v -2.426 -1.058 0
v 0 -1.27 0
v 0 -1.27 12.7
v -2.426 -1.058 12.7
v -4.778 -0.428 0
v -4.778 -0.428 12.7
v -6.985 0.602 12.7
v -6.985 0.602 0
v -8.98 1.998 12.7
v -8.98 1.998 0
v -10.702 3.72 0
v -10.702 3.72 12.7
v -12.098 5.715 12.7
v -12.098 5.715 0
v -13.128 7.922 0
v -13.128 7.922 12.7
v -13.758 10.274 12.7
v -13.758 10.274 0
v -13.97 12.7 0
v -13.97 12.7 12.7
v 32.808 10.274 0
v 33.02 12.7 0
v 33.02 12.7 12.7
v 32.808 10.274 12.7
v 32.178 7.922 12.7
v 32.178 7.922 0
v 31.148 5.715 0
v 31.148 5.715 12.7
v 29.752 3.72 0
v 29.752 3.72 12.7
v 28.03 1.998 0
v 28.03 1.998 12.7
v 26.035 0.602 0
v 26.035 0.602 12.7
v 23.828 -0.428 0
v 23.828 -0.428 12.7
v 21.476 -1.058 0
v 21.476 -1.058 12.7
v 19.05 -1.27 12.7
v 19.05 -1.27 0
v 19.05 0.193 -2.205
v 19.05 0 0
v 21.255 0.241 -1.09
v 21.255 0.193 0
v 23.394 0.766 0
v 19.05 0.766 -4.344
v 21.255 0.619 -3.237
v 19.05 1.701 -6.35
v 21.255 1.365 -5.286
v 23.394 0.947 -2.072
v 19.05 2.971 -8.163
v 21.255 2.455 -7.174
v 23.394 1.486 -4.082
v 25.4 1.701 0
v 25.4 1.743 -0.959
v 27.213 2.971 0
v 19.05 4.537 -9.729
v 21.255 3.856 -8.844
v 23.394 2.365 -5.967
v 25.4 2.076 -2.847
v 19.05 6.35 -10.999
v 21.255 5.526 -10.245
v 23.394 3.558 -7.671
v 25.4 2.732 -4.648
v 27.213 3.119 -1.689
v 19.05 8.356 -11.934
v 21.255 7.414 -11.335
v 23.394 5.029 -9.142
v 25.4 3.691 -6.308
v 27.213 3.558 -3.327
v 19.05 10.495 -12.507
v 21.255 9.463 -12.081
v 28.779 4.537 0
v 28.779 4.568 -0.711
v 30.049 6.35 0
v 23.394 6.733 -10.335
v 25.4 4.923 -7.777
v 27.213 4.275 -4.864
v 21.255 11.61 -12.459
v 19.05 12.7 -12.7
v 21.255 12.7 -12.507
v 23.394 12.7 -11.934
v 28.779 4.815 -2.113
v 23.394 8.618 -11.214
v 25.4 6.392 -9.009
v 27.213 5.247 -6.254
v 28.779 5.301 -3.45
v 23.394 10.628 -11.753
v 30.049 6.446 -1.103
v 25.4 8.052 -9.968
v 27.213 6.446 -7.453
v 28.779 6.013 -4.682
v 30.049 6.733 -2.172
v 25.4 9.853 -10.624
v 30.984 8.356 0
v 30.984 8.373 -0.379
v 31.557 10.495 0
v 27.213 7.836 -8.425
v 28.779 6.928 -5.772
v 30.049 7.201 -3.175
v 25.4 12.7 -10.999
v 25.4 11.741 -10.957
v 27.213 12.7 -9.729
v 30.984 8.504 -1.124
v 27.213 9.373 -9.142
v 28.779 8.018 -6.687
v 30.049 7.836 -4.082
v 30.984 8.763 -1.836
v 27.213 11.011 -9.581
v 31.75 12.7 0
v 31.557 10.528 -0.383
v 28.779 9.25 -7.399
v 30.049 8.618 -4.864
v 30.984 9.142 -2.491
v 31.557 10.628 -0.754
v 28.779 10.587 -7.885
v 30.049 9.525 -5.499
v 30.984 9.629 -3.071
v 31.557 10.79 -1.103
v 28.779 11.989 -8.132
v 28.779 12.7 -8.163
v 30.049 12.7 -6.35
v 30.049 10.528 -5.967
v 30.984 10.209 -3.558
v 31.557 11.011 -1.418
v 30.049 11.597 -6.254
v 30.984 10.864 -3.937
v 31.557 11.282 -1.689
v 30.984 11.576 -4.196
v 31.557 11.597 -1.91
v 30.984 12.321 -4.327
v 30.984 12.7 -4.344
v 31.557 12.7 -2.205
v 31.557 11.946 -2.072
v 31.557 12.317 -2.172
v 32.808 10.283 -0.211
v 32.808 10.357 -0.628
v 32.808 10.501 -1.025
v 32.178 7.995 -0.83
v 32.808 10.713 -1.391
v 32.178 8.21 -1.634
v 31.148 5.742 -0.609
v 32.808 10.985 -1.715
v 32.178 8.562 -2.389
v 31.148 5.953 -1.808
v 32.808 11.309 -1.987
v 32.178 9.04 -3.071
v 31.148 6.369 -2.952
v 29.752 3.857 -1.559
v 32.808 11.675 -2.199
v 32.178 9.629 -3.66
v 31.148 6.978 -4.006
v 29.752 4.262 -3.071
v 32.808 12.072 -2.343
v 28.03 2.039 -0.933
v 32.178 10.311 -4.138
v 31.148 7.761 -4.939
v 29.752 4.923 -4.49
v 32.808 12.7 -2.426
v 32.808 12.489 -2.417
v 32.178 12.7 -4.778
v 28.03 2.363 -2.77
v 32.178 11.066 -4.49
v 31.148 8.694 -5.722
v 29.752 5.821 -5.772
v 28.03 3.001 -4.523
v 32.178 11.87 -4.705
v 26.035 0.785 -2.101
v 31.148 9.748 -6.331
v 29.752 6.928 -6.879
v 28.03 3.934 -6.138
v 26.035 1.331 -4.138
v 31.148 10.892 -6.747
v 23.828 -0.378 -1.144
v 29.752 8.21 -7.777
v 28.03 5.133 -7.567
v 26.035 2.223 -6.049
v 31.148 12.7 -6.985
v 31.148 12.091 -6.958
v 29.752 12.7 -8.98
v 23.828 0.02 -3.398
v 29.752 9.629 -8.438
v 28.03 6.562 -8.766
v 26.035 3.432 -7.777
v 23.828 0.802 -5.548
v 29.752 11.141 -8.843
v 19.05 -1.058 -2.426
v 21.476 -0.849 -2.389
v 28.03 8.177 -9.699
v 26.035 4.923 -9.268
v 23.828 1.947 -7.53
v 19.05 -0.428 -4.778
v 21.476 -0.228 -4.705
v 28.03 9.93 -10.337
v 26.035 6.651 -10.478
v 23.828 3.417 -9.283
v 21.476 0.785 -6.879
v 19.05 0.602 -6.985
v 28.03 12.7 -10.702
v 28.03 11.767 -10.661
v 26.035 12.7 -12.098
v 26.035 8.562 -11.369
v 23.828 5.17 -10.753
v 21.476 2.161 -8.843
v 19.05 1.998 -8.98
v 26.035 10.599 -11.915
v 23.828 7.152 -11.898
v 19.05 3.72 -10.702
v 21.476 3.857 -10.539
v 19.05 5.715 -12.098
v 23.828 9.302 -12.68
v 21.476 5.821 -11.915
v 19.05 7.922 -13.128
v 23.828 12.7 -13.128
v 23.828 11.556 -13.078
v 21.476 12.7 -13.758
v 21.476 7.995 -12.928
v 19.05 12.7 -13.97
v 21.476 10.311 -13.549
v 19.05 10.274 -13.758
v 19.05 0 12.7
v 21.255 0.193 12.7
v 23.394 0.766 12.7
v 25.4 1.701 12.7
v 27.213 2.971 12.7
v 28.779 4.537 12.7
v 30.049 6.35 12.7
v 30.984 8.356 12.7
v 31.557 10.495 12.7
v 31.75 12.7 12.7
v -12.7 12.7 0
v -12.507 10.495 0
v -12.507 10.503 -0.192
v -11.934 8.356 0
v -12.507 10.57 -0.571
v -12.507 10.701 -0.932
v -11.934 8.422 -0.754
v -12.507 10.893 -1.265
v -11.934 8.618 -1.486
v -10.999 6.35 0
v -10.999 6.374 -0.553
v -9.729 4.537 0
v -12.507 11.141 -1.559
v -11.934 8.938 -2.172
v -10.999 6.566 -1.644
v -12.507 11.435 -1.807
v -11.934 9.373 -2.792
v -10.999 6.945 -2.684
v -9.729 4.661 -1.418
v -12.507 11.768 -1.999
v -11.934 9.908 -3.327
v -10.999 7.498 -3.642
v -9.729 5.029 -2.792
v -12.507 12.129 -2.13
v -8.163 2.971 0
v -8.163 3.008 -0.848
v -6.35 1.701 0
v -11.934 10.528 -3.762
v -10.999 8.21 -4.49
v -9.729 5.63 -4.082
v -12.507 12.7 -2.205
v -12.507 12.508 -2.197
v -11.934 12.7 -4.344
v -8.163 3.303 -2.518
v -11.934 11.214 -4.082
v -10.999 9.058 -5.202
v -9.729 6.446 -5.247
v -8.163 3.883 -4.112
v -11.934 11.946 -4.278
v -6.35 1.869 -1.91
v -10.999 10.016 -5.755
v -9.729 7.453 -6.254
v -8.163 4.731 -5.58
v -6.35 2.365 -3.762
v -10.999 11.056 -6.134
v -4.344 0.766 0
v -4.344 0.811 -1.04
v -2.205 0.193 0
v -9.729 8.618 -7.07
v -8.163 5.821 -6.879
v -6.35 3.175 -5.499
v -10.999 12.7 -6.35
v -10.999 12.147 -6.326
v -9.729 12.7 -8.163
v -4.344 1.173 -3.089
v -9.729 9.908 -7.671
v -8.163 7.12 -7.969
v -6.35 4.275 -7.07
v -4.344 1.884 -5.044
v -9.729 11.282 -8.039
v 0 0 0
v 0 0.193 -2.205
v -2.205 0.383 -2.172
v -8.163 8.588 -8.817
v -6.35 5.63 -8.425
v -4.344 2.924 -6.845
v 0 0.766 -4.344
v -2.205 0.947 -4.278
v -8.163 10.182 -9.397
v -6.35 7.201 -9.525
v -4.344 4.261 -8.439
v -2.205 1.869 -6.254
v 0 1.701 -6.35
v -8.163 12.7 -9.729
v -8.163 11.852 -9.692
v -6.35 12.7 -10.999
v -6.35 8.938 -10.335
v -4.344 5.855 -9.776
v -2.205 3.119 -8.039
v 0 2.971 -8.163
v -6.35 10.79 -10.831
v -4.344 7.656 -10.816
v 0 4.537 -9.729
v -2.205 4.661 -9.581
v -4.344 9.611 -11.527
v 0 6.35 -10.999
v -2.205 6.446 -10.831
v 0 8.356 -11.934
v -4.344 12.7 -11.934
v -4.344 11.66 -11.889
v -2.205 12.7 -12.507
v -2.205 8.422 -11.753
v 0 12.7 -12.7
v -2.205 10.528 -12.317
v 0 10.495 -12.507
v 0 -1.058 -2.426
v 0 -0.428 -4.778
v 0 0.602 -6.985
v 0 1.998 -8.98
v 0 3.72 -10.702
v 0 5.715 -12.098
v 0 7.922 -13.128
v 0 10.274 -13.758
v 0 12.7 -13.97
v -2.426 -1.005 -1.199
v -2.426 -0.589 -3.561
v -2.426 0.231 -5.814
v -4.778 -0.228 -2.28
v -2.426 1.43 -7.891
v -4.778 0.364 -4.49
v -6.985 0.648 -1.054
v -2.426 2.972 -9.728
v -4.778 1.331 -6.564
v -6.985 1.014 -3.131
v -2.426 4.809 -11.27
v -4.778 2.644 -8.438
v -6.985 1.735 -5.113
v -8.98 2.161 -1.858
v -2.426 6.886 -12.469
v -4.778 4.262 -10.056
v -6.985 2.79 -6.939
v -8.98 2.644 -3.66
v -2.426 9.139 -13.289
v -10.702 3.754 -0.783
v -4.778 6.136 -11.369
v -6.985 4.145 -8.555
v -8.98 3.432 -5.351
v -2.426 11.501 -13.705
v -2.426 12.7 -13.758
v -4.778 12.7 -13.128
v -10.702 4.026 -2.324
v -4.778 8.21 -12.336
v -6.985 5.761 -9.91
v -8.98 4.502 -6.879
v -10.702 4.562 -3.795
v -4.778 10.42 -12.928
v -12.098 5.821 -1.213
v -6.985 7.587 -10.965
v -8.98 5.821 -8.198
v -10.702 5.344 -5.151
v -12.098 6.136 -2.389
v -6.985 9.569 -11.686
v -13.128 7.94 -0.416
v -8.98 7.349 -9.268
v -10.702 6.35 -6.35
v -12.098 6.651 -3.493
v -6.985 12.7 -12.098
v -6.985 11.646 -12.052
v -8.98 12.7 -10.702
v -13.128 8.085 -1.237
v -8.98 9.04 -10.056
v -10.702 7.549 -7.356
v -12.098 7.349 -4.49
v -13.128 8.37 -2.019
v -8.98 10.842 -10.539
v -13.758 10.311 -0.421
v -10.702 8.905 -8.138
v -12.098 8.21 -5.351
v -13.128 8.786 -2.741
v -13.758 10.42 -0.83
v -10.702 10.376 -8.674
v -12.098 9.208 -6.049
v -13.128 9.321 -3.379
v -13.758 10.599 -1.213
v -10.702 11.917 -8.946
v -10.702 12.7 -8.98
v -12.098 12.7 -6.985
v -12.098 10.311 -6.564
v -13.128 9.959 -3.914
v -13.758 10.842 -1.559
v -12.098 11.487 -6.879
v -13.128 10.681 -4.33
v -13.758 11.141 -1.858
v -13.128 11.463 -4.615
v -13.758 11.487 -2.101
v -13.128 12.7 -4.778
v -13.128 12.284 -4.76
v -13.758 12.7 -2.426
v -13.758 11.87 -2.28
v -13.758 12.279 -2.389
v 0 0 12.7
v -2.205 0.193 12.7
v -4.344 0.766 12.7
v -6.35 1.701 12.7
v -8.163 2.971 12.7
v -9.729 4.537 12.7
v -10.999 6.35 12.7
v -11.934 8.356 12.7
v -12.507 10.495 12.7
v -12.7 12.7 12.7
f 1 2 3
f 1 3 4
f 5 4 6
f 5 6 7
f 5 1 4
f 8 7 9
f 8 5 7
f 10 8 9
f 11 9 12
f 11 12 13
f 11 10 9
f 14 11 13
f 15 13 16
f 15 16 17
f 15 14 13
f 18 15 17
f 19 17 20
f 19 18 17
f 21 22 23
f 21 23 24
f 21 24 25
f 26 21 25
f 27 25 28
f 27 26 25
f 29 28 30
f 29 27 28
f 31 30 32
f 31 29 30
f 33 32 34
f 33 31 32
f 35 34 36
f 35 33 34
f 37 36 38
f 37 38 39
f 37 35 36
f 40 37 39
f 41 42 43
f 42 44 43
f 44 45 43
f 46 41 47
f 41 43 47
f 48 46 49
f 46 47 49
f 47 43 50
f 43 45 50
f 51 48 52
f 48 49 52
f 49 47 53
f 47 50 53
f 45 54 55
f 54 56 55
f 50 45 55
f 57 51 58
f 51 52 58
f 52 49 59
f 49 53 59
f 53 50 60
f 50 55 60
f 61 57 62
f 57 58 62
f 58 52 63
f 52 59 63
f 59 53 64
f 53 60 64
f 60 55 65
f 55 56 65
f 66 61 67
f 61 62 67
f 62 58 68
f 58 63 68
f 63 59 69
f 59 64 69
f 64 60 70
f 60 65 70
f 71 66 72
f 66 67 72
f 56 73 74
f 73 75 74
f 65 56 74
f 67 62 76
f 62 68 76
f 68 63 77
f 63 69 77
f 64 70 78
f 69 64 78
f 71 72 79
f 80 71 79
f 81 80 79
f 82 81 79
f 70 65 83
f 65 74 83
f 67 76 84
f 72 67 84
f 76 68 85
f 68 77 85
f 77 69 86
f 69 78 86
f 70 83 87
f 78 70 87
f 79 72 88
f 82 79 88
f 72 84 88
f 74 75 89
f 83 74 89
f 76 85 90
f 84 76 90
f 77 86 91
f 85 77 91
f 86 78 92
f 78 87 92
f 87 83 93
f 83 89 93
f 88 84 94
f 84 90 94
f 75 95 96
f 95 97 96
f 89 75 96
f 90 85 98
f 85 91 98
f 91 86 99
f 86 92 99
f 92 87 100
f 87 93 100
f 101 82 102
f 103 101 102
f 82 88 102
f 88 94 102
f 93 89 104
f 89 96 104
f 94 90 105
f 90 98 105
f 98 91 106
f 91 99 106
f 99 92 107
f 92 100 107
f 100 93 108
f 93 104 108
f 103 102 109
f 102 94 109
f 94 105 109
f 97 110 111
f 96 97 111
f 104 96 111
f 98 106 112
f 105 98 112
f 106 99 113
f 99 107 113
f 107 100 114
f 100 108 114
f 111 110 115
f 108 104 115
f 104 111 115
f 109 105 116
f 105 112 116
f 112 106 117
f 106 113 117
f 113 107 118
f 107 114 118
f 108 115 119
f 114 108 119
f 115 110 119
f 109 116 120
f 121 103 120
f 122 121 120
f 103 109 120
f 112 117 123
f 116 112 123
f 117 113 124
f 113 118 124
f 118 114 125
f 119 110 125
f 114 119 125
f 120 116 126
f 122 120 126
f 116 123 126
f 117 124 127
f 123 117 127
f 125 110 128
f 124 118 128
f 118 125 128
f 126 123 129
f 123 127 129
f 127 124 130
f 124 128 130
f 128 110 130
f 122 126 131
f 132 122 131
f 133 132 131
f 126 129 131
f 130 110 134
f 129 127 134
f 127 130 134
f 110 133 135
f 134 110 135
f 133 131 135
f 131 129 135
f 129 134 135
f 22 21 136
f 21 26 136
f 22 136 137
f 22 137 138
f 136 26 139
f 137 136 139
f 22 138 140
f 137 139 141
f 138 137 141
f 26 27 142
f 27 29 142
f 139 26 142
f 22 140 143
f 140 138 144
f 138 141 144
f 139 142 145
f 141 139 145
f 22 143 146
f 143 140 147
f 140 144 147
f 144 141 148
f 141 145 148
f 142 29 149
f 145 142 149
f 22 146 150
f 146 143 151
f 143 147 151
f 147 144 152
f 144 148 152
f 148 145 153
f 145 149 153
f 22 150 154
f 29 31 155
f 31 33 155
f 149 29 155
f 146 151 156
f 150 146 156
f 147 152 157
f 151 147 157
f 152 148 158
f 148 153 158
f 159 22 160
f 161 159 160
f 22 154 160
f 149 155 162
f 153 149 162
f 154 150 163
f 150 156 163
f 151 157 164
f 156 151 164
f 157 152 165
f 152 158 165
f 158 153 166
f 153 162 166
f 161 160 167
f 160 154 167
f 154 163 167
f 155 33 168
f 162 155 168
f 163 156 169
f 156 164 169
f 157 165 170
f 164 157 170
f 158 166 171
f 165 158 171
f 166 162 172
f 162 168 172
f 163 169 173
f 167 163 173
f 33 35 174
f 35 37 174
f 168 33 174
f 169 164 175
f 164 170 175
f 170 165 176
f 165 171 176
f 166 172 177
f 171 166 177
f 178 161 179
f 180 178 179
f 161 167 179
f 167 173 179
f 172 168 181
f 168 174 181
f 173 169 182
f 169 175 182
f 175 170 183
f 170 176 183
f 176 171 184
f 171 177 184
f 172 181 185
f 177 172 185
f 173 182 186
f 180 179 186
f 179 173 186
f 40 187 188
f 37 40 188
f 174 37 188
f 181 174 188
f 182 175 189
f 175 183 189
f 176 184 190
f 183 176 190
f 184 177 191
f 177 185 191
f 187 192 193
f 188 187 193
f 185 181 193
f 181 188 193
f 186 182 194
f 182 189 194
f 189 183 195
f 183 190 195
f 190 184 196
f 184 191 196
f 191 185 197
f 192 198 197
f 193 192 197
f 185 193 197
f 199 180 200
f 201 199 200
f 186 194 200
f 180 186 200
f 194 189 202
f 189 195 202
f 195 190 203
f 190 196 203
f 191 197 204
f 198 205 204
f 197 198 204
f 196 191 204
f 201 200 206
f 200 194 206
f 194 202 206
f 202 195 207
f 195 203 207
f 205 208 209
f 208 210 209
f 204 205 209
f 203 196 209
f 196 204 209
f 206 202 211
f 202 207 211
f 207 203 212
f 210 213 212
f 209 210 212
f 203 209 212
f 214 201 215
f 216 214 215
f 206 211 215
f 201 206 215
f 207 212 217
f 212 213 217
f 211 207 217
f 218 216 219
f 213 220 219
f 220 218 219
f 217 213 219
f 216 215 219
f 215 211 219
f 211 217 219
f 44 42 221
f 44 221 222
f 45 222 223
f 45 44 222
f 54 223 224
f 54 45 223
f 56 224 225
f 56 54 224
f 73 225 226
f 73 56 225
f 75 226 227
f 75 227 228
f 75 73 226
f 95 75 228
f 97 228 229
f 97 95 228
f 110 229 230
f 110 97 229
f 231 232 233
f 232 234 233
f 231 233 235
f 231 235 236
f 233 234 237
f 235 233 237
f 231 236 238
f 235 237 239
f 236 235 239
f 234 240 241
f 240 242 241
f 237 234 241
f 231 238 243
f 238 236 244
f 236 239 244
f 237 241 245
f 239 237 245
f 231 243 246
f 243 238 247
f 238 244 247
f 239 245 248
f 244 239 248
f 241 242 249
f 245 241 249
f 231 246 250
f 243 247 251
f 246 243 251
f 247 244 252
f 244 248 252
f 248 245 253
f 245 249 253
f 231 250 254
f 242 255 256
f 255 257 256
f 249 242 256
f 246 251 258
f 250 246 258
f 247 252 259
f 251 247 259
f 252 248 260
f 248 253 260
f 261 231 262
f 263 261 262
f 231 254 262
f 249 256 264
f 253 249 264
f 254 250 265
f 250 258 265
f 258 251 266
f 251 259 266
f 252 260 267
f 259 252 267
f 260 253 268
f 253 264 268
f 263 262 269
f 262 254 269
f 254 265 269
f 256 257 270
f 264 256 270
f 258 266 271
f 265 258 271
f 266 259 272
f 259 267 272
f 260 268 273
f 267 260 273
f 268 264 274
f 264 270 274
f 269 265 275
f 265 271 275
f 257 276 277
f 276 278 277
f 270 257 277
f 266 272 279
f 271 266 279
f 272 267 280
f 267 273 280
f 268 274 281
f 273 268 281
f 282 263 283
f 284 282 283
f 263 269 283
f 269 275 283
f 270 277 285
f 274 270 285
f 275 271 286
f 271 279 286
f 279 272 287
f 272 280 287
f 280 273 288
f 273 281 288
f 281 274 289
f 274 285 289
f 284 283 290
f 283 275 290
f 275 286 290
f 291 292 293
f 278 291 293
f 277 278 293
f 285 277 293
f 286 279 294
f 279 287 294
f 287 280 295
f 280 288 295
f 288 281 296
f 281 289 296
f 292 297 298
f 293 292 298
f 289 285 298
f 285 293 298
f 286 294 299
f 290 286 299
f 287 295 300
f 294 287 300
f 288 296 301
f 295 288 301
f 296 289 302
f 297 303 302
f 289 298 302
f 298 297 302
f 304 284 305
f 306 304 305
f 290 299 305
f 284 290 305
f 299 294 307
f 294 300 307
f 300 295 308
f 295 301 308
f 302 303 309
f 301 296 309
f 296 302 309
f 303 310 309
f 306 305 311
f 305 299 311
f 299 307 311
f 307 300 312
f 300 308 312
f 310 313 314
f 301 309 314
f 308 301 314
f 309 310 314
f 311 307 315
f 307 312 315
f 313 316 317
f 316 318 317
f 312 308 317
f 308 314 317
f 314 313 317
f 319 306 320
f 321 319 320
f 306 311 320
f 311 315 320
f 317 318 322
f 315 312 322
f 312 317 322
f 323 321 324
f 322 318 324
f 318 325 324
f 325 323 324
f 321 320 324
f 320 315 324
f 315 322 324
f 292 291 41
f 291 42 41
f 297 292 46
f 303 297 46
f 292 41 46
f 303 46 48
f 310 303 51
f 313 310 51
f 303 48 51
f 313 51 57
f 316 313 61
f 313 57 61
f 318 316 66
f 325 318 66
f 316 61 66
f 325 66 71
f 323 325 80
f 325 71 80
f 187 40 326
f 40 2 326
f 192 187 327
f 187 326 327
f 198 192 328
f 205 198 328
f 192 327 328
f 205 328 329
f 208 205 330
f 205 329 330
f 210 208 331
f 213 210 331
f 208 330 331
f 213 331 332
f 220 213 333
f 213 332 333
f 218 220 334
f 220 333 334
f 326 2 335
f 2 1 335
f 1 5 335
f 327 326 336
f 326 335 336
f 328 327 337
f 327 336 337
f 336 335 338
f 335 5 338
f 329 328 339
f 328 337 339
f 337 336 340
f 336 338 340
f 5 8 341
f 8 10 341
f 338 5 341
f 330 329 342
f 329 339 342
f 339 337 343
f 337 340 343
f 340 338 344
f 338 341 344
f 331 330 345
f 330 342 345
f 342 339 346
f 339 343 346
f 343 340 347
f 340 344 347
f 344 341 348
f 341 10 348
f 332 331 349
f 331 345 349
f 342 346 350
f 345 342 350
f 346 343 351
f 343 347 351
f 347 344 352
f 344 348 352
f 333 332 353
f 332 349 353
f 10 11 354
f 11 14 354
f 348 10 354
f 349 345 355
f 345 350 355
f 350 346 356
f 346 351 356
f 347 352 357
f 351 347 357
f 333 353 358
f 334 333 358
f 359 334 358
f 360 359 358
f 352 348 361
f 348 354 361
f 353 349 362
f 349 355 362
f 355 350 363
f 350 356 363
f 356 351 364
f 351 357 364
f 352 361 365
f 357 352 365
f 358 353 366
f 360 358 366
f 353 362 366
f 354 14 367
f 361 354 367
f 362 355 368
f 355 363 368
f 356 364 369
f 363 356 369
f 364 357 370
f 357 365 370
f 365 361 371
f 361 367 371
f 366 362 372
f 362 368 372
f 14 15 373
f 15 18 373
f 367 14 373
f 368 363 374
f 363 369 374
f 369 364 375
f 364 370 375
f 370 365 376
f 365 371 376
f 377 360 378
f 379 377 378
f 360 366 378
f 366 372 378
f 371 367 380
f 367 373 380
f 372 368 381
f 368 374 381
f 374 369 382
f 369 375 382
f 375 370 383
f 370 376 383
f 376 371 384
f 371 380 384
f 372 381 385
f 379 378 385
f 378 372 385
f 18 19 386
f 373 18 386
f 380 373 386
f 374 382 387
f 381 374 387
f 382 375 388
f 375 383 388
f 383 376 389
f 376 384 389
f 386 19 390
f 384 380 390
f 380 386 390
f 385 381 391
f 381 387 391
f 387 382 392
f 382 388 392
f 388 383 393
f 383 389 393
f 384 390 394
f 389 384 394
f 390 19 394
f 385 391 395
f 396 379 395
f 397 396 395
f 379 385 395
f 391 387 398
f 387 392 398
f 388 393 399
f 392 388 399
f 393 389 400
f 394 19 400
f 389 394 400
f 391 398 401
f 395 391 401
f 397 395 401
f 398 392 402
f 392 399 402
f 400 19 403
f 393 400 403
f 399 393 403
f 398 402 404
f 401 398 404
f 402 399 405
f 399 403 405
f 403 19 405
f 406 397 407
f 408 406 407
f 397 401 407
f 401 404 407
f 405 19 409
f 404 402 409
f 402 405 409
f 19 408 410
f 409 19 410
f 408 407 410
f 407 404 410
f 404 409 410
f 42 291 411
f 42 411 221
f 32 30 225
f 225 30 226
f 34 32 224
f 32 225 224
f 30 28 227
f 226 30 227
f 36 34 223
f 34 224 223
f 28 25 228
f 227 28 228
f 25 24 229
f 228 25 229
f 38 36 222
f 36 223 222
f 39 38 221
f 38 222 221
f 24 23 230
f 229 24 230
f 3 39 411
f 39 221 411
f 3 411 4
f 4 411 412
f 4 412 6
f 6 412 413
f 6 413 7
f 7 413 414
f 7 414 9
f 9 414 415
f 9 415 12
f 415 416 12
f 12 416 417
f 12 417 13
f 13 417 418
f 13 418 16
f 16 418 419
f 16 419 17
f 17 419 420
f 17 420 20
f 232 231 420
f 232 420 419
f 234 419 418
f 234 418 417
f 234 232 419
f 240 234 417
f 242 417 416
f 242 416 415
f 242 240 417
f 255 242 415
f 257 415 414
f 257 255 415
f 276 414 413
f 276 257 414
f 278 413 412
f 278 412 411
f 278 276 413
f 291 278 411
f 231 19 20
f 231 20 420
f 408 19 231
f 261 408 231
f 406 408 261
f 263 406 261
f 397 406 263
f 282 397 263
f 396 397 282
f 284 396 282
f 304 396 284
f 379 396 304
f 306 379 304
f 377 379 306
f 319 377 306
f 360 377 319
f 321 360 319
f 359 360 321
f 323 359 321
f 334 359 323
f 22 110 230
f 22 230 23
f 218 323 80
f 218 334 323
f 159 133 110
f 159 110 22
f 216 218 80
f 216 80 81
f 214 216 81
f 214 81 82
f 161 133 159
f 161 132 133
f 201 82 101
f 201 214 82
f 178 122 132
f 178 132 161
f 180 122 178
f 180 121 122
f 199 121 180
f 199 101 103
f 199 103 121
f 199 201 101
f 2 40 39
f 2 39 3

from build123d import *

# Parameters (mm, degrees)
REVOLVE_THIN1_ANGLE = 90
EXTRUDE_THIN1_DEPTH = 12.7


with BuildPart() as part:
    # Sketch1 → Revolve-Thin1 (revolve)
    with BuildSketch(Plane.XY):
        with BuildLine():
            ThreePointArc((-12.7, 12.7), (-8.980256121, 3.719743879), (0, 0))
            Line((0, 0), (19.05, 0))
            ThreePointArc((19.05, 0), (28.030256121, 3.719743879), (31.75, 12.7))
            Line((31.75, 12.7), (33.02, 12.7))
            ThreePointArc((33.02, 12.7), (28.928281733, 2.821718267), (19.05, -1.27))
            Line((19.05, -1.27), (0, -1.27))
            ThreePointArc((0, -1.27), (-9.878281733, 2.821718267), (-13.97, 12.7))
            Line((-13.97, 12.7), (-12.7, 12.7))
        make_face()
    revolve(axis=Axis((-12.7, 12.7, 0), (1, 0, 0)), revolution_arc=REVOLVE_THIN1_ANGLE)

    # Sketch1<2> → Extrude-Thin1 (add)
    with BuildSketch(Plane.XY):
        with BuildLine():
            ThreePointArc((-12.7, 12.7), (-8.980256121, 3.719743879), (0, 0))
            Line((0, 0), (19.05, 0))
            ThreePointArc((19.05, 0), (28.030256121, 3.719743879), (31.75, 12.7))
            Line((31.75, 12.7), (33.02, 12.7))
            ThreePointArc((33.02, 12.7), (28.928281733, 2.821718267), (19.05, -1.27))
            Line((19.05, -1.27), (0, -1.27))
            ThreePointArc((0, -1.27), (-9.878281733, 2.821718267), (-13.97, 12.7))
            Line((-13.97, 12.7), (-12.7, 12.7))
        make_face()
    extrude(amount=EXTRUDE_THIN1_DEPTH)


solid = part.part
